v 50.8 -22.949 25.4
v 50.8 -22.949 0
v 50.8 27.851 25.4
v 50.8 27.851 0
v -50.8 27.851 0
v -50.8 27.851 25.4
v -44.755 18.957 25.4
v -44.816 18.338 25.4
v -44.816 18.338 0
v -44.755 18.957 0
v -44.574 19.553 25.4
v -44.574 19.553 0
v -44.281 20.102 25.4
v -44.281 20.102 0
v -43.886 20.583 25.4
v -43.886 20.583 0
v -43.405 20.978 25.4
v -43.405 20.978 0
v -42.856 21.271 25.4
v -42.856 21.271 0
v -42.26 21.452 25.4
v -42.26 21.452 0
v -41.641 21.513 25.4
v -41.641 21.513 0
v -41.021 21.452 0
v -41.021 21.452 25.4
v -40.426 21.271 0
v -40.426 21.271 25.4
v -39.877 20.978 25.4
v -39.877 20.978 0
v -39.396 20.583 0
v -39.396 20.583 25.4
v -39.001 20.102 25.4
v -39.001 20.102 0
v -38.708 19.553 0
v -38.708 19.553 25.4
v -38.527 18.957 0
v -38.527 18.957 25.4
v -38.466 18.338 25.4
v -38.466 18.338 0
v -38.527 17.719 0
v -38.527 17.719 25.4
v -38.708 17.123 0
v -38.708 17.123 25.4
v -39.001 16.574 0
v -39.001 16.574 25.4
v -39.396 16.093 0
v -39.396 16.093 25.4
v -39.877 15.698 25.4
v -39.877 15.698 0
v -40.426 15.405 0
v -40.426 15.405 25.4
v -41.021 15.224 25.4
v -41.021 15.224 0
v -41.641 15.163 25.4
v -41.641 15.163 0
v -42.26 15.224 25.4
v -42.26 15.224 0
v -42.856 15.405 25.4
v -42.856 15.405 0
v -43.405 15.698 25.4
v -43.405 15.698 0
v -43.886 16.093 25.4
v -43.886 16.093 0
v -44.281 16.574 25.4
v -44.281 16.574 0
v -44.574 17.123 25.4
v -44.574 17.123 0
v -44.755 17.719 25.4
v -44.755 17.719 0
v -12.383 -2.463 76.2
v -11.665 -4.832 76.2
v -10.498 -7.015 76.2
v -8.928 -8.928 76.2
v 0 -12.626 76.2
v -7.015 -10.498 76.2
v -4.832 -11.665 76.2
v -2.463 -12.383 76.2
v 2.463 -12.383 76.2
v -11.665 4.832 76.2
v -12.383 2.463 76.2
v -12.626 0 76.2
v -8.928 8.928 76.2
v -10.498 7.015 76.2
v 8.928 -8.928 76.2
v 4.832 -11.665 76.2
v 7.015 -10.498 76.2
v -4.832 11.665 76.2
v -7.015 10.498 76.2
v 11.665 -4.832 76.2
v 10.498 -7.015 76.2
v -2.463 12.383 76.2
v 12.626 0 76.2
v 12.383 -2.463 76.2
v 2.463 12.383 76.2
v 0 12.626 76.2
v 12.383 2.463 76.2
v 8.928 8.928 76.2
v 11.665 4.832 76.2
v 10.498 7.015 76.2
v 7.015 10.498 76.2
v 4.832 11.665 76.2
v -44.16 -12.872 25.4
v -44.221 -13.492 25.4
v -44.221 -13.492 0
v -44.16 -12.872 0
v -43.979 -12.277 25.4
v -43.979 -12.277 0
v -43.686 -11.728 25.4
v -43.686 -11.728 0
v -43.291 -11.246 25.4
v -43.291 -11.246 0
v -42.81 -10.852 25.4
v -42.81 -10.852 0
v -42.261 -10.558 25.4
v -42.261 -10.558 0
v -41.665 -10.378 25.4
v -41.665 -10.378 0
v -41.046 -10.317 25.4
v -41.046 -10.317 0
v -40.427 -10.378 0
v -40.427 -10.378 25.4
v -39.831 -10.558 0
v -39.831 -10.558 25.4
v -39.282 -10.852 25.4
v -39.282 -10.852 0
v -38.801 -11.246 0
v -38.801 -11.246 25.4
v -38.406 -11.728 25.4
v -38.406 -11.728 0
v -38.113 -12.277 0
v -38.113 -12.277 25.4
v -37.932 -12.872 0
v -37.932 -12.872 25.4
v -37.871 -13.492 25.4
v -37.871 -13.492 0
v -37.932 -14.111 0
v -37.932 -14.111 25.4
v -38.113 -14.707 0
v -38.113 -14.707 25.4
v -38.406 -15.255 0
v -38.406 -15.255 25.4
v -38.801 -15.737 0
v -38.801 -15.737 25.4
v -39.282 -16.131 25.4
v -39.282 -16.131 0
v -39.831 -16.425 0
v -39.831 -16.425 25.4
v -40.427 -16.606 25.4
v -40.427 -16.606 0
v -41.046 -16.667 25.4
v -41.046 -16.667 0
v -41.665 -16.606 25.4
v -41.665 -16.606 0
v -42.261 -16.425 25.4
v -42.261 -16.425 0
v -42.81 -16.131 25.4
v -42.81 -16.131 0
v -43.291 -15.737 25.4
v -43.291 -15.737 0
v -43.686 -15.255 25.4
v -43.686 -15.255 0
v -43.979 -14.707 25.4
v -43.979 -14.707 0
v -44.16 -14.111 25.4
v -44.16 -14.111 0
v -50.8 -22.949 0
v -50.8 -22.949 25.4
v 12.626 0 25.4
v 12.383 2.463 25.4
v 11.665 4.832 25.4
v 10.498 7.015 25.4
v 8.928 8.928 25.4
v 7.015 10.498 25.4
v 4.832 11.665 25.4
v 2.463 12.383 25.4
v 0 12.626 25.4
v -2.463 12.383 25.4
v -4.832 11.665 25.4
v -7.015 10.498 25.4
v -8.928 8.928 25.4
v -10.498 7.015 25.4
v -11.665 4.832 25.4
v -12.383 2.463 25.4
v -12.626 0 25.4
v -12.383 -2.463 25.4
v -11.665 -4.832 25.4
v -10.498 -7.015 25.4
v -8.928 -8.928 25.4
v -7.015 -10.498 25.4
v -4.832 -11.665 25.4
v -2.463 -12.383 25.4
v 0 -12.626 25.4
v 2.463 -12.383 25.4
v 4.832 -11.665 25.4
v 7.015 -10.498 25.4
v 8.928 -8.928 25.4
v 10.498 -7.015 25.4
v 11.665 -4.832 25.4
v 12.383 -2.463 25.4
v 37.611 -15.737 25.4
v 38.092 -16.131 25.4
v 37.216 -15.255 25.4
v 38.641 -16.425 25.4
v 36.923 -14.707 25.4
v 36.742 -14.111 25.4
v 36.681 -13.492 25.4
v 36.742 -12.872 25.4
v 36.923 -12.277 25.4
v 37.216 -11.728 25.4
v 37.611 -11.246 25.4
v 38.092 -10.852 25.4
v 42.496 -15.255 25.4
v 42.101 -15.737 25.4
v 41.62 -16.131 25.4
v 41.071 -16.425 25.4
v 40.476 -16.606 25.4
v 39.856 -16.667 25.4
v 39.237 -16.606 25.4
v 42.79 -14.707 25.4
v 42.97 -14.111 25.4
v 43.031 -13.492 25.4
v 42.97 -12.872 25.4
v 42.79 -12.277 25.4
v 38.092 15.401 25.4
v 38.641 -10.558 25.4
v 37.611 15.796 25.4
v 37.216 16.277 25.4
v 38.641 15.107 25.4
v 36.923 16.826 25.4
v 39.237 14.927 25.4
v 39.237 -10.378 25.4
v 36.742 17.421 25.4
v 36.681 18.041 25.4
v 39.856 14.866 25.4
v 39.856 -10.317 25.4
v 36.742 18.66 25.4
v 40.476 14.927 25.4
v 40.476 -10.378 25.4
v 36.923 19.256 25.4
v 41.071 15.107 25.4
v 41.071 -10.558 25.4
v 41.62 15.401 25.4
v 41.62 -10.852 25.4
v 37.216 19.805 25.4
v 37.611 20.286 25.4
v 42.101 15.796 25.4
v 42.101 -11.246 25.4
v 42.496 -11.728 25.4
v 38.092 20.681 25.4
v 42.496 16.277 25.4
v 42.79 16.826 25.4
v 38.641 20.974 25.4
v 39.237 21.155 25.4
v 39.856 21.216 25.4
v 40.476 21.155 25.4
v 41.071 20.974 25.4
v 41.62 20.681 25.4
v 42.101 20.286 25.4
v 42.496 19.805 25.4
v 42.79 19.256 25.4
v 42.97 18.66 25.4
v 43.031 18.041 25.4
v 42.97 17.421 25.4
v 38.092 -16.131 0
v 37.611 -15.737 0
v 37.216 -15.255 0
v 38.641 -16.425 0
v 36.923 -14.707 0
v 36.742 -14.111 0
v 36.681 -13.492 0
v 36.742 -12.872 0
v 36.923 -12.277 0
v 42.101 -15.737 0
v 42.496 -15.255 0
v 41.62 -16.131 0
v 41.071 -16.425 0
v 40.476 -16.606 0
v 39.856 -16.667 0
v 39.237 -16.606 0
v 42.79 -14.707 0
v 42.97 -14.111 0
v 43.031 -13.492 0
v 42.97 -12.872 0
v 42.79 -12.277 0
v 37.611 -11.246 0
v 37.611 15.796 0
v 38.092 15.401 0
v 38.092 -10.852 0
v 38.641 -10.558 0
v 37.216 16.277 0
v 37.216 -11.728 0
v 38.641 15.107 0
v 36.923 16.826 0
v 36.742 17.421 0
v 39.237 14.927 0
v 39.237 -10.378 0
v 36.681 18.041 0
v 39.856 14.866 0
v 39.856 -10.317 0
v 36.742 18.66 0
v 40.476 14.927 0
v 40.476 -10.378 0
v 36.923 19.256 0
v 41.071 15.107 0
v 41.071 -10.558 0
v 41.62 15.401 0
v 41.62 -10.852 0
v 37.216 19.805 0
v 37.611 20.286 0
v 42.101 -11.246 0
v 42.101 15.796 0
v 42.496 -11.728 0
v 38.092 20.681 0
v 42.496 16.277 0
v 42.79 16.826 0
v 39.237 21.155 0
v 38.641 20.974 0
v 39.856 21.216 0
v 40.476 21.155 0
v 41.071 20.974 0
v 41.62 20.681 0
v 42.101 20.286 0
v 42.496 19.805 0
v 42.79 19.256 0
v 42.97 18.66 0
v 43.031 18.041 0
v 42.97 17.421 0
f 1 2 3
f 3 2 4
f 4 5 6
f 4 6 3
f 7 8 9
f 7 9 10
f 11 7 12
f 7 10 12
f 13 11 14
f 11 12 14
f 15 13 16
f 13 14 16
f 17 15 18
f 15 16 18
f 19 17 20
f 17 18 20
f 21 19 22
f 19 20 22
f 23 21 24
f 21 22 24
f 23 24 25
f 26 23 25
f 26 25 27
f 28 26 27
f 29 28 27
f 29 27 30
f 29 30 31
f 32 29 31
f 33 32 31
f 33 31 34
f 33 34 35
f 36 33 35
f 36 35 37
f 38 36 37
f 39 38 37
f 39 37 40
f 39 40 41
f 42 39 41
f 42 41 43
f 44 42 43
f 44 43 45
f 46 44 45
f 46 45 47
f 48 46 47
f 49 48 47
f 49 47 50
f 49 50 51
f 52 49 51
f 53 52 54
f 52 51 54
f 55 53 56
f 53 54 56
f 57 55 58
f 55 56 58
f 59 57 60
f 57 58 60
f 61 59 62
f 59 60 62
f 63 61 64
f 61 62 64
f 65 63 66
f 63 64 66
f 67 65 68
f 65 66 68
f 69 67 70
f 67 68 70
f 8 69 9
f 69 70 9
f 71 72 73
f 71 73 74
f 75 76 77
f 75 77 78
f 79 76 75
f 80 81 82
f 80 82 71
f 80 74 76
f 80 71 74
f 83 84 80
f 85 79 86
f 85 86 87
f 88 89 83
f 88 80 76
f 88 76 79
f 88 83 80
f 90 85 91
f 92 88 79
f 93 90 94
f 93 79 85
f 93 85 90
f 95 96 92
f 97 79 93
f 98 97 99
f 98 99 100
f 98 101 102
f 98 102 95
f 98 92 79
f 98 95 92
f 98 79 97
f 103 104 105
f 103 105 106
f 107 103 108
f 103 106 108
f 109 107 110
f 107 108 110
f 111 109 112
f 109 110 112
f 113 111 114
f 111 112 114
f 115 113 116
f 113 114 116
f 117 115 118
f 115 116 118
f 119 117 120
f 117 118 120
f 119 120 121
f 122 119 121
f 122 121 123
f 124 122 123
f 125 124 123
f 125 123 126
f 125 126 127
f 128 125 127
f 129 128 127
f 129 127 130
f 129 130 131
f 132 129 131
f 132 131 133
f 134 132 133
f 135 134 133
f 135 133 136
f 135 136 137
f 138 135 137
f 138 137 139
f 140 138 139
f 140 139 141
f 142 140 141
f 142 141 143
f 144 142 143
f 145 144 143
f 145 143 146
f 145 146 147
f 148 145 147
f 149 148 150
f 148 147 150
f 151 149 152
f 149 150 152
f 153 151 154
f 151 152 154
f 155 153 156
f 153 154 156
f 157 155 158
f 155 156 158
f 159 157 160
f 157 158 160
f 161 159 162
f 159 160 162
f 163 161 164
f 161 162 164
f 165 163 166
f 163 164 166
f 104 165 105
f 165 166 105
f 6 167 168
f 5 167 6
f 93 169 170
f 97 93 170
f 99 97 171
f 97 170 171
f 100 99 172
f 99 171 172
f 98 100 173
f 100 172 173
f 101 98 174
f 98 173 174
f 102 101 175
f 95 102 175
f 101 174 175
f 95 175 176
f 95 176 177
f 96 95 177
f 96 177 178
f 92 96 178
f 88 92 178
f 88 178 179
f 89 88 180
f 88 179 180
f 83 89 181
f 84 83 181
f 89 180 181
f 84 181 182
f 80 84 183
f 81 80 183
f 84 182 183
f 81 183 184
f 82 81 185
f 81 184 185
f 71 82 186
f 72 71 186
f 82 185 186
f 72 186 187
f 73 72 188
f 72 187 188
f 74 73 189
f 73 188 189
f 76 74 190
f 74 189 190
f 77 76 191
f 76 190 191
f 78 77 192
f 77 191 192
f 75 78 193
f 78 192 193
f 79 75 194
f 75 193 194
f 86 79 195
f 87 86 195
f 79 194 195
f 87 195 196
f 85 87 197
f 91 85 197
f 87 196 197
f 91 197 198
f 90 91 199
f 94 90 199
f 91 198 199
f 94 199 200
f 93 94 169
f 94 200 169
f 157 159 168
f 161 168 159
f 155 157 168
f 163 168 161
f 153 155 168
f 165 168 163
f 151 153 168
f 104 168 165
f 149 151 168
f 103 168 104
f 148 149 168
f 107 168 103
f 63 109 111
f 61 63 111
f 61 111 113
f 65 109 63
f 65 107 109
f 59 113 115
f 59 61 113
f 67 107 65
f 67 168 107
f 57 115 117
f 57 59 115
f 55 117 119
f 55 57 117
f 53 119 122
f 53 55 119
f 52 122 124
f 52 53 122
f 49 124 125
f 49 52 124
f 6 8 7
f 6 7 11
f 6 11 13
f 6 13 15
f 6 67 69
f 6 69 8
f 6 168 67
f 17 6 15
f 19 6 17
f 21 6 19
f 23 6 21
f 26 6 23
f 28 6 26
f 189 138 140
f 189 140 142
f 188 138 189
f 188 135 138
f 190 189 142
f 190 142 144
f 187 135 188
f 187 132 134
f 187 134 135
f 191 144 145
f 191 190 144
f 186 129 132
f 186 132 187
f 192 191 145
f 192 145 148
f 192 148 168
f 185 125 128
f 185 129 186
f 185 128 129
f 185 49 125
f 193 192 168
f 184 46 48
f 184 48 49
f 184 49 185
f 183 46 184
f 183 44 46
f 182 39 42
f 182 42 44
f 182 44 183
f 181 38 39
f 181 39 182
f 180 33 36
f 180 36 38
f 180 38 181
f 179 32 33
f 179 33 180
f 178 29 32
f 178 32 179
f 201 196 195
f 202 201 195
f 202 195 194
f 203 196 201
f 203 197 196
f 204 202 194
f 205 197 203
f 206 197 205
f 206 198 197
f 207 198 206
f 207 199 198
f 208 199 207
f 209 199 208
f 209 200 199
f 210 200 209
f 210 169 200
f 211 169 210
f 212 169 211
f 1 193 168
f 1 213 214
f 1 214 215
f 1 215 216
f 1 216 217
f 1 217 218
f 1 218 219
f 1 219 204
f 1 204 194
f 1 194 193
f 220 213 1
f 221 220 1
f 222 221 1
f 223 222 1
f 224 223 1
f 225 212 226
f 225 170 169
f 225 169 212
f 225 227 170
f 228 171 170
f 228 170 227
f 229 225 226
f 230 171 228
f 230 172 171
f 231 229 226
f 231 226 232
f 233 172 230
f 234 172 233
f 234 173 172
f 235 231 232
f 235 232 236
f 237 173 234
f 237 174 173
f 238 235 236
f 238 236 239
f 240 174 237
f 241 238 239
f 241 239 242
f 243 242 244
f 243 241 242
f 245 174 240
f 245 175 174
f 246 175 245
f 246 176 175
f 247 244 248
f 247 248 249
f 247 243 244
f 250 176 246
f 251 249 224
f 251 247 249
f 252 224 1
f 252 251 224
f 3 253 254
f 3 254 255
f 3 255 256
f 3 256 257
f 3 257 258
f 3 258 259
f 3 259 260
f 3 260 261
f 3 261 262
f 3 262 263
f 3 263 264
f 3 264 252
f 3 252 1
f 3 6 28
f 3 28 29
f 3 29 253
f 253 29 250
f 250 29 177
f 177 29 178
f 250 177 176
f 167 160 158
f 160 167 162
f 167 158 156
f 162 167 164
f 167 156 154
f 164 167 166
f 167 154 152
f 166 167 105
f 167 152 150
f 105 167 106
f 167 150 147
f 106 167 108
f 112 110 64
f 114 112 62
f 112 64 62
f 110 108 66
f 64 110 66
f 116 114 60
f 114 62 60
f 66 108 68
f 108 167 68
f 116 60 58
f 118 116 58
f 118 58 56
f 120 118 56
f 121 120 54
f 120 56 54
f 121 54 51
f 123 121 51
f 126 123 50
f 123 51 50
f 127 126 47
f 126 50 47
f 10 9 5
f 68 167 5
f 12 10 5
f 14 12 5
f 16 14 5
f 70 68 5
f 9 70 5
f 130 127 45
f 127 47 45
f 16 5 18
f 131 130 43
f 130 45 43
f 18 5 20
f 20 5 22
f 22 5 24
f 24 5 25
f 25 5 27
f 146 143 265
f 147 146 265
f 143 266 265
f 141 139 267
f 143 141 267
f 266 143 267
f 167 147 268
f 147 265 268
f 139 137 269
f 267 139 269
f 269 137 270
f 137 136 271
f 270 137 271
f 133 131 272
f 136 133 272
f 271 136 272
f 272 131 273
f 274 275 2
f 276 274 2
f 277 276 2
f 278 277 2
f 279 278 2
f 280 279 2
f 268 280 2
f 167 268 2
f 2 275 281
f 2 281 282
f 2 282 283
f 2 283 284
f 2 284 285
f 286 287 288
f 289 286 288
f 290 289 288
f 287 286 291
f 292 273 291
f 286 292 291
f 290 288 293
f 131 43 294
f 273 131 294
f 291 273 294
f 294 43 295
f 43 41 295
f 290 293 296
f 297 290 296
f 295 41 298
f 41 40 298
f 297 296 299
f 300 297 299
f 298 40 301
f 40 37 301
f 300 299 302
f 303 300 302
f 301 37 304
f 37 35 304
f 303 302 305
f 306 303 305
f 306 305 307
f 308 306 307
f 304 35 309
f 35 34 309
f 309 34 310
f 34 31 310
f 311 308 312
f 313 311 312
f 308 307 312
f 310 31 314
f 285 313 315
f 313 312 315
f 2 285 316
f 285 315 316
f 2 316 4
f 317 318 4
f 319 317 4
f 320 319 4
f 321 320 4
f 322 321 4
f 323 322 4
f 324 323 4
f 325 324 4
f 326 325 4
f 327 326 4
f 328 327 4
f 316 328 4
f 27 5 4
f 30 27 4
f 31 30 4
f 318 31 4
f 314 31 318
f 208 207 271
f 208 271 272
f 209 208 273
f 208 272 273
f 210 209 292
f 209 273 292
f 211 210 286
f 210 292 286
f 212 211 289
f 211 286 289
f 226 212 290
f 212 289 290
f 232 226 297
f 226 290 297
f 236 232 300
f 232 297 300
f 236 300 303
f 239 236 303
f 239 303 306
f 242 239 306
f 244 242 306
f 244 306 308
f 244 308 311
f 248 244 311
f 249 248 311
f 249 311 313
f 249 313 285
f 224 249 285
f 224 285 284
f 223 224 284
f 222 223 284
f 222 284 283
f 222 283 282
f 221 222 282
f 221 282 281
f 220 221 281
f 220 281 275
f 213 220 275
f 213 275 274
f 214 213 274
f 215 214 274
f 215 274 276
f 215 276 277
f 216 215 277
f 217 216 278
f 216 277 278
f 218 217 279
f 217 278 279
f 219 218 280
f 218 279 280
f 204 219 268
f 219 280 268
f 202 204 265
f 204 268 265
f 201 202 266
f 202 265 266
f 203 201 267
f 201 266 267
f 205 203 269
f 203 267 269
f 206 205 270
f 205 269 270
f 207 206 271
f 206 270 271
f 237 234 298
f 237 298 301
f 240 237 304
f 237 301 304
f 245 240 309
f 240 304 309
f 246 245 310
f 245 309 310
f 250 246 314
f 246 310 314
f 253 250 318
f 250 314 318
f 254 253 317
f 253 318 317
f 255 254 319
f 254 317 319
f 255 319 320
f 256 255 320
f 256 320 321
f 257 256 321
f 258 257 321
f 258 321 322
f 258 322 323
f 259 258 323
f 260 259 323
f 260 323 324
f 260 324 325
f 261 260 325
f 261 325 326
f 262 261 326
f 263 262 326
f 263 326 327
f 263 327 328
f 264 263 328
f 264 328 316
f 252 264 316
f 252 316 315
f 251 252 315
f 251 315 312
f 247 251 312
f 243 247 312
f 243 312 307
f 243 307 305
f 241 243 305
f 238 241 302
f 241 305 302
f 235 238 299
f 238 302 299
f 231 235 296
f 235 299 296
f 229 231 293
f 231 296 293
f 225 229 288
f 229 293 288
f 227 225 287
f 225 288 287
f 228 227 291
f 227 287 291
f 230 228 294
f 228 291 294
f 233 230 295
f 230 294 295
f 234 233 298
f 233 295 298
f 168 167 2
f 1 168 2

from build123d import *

# Parameters (mm, degrees)
F0_W     = 101.6
F0_H     = 50.8
F1_DEPTH = 25.4
F3_R     = 12.626105
F4_DEPTH = 50.8
F5_D     = 6.35


with BuildPart() as f1:
    # F0 (on Top) → F1 (new body)
    with BuildSketch(Plane.XY):
        with Locations((0, 2.451474)):
            Rectangle(F0_W, F0_H)
    extrude(amount=F1_DEPTH)

    # F3 (on face) → F4 (join)
    with BuildSketch(Plane.XY.offset(25.4)):
        Circle(F3_R)
    extrude(amount=F4_DEPTH)

    # F5 (through all)
    with Locations(Plane.XY.offset(25.4)):
        with Locations((-41.046023, -13.491523), (39.856285, -13.491523), (39.856285, 18.040607), (-41.640893, 18.33808)):
            Hole(F5_D / 2)


solid = f1.part
